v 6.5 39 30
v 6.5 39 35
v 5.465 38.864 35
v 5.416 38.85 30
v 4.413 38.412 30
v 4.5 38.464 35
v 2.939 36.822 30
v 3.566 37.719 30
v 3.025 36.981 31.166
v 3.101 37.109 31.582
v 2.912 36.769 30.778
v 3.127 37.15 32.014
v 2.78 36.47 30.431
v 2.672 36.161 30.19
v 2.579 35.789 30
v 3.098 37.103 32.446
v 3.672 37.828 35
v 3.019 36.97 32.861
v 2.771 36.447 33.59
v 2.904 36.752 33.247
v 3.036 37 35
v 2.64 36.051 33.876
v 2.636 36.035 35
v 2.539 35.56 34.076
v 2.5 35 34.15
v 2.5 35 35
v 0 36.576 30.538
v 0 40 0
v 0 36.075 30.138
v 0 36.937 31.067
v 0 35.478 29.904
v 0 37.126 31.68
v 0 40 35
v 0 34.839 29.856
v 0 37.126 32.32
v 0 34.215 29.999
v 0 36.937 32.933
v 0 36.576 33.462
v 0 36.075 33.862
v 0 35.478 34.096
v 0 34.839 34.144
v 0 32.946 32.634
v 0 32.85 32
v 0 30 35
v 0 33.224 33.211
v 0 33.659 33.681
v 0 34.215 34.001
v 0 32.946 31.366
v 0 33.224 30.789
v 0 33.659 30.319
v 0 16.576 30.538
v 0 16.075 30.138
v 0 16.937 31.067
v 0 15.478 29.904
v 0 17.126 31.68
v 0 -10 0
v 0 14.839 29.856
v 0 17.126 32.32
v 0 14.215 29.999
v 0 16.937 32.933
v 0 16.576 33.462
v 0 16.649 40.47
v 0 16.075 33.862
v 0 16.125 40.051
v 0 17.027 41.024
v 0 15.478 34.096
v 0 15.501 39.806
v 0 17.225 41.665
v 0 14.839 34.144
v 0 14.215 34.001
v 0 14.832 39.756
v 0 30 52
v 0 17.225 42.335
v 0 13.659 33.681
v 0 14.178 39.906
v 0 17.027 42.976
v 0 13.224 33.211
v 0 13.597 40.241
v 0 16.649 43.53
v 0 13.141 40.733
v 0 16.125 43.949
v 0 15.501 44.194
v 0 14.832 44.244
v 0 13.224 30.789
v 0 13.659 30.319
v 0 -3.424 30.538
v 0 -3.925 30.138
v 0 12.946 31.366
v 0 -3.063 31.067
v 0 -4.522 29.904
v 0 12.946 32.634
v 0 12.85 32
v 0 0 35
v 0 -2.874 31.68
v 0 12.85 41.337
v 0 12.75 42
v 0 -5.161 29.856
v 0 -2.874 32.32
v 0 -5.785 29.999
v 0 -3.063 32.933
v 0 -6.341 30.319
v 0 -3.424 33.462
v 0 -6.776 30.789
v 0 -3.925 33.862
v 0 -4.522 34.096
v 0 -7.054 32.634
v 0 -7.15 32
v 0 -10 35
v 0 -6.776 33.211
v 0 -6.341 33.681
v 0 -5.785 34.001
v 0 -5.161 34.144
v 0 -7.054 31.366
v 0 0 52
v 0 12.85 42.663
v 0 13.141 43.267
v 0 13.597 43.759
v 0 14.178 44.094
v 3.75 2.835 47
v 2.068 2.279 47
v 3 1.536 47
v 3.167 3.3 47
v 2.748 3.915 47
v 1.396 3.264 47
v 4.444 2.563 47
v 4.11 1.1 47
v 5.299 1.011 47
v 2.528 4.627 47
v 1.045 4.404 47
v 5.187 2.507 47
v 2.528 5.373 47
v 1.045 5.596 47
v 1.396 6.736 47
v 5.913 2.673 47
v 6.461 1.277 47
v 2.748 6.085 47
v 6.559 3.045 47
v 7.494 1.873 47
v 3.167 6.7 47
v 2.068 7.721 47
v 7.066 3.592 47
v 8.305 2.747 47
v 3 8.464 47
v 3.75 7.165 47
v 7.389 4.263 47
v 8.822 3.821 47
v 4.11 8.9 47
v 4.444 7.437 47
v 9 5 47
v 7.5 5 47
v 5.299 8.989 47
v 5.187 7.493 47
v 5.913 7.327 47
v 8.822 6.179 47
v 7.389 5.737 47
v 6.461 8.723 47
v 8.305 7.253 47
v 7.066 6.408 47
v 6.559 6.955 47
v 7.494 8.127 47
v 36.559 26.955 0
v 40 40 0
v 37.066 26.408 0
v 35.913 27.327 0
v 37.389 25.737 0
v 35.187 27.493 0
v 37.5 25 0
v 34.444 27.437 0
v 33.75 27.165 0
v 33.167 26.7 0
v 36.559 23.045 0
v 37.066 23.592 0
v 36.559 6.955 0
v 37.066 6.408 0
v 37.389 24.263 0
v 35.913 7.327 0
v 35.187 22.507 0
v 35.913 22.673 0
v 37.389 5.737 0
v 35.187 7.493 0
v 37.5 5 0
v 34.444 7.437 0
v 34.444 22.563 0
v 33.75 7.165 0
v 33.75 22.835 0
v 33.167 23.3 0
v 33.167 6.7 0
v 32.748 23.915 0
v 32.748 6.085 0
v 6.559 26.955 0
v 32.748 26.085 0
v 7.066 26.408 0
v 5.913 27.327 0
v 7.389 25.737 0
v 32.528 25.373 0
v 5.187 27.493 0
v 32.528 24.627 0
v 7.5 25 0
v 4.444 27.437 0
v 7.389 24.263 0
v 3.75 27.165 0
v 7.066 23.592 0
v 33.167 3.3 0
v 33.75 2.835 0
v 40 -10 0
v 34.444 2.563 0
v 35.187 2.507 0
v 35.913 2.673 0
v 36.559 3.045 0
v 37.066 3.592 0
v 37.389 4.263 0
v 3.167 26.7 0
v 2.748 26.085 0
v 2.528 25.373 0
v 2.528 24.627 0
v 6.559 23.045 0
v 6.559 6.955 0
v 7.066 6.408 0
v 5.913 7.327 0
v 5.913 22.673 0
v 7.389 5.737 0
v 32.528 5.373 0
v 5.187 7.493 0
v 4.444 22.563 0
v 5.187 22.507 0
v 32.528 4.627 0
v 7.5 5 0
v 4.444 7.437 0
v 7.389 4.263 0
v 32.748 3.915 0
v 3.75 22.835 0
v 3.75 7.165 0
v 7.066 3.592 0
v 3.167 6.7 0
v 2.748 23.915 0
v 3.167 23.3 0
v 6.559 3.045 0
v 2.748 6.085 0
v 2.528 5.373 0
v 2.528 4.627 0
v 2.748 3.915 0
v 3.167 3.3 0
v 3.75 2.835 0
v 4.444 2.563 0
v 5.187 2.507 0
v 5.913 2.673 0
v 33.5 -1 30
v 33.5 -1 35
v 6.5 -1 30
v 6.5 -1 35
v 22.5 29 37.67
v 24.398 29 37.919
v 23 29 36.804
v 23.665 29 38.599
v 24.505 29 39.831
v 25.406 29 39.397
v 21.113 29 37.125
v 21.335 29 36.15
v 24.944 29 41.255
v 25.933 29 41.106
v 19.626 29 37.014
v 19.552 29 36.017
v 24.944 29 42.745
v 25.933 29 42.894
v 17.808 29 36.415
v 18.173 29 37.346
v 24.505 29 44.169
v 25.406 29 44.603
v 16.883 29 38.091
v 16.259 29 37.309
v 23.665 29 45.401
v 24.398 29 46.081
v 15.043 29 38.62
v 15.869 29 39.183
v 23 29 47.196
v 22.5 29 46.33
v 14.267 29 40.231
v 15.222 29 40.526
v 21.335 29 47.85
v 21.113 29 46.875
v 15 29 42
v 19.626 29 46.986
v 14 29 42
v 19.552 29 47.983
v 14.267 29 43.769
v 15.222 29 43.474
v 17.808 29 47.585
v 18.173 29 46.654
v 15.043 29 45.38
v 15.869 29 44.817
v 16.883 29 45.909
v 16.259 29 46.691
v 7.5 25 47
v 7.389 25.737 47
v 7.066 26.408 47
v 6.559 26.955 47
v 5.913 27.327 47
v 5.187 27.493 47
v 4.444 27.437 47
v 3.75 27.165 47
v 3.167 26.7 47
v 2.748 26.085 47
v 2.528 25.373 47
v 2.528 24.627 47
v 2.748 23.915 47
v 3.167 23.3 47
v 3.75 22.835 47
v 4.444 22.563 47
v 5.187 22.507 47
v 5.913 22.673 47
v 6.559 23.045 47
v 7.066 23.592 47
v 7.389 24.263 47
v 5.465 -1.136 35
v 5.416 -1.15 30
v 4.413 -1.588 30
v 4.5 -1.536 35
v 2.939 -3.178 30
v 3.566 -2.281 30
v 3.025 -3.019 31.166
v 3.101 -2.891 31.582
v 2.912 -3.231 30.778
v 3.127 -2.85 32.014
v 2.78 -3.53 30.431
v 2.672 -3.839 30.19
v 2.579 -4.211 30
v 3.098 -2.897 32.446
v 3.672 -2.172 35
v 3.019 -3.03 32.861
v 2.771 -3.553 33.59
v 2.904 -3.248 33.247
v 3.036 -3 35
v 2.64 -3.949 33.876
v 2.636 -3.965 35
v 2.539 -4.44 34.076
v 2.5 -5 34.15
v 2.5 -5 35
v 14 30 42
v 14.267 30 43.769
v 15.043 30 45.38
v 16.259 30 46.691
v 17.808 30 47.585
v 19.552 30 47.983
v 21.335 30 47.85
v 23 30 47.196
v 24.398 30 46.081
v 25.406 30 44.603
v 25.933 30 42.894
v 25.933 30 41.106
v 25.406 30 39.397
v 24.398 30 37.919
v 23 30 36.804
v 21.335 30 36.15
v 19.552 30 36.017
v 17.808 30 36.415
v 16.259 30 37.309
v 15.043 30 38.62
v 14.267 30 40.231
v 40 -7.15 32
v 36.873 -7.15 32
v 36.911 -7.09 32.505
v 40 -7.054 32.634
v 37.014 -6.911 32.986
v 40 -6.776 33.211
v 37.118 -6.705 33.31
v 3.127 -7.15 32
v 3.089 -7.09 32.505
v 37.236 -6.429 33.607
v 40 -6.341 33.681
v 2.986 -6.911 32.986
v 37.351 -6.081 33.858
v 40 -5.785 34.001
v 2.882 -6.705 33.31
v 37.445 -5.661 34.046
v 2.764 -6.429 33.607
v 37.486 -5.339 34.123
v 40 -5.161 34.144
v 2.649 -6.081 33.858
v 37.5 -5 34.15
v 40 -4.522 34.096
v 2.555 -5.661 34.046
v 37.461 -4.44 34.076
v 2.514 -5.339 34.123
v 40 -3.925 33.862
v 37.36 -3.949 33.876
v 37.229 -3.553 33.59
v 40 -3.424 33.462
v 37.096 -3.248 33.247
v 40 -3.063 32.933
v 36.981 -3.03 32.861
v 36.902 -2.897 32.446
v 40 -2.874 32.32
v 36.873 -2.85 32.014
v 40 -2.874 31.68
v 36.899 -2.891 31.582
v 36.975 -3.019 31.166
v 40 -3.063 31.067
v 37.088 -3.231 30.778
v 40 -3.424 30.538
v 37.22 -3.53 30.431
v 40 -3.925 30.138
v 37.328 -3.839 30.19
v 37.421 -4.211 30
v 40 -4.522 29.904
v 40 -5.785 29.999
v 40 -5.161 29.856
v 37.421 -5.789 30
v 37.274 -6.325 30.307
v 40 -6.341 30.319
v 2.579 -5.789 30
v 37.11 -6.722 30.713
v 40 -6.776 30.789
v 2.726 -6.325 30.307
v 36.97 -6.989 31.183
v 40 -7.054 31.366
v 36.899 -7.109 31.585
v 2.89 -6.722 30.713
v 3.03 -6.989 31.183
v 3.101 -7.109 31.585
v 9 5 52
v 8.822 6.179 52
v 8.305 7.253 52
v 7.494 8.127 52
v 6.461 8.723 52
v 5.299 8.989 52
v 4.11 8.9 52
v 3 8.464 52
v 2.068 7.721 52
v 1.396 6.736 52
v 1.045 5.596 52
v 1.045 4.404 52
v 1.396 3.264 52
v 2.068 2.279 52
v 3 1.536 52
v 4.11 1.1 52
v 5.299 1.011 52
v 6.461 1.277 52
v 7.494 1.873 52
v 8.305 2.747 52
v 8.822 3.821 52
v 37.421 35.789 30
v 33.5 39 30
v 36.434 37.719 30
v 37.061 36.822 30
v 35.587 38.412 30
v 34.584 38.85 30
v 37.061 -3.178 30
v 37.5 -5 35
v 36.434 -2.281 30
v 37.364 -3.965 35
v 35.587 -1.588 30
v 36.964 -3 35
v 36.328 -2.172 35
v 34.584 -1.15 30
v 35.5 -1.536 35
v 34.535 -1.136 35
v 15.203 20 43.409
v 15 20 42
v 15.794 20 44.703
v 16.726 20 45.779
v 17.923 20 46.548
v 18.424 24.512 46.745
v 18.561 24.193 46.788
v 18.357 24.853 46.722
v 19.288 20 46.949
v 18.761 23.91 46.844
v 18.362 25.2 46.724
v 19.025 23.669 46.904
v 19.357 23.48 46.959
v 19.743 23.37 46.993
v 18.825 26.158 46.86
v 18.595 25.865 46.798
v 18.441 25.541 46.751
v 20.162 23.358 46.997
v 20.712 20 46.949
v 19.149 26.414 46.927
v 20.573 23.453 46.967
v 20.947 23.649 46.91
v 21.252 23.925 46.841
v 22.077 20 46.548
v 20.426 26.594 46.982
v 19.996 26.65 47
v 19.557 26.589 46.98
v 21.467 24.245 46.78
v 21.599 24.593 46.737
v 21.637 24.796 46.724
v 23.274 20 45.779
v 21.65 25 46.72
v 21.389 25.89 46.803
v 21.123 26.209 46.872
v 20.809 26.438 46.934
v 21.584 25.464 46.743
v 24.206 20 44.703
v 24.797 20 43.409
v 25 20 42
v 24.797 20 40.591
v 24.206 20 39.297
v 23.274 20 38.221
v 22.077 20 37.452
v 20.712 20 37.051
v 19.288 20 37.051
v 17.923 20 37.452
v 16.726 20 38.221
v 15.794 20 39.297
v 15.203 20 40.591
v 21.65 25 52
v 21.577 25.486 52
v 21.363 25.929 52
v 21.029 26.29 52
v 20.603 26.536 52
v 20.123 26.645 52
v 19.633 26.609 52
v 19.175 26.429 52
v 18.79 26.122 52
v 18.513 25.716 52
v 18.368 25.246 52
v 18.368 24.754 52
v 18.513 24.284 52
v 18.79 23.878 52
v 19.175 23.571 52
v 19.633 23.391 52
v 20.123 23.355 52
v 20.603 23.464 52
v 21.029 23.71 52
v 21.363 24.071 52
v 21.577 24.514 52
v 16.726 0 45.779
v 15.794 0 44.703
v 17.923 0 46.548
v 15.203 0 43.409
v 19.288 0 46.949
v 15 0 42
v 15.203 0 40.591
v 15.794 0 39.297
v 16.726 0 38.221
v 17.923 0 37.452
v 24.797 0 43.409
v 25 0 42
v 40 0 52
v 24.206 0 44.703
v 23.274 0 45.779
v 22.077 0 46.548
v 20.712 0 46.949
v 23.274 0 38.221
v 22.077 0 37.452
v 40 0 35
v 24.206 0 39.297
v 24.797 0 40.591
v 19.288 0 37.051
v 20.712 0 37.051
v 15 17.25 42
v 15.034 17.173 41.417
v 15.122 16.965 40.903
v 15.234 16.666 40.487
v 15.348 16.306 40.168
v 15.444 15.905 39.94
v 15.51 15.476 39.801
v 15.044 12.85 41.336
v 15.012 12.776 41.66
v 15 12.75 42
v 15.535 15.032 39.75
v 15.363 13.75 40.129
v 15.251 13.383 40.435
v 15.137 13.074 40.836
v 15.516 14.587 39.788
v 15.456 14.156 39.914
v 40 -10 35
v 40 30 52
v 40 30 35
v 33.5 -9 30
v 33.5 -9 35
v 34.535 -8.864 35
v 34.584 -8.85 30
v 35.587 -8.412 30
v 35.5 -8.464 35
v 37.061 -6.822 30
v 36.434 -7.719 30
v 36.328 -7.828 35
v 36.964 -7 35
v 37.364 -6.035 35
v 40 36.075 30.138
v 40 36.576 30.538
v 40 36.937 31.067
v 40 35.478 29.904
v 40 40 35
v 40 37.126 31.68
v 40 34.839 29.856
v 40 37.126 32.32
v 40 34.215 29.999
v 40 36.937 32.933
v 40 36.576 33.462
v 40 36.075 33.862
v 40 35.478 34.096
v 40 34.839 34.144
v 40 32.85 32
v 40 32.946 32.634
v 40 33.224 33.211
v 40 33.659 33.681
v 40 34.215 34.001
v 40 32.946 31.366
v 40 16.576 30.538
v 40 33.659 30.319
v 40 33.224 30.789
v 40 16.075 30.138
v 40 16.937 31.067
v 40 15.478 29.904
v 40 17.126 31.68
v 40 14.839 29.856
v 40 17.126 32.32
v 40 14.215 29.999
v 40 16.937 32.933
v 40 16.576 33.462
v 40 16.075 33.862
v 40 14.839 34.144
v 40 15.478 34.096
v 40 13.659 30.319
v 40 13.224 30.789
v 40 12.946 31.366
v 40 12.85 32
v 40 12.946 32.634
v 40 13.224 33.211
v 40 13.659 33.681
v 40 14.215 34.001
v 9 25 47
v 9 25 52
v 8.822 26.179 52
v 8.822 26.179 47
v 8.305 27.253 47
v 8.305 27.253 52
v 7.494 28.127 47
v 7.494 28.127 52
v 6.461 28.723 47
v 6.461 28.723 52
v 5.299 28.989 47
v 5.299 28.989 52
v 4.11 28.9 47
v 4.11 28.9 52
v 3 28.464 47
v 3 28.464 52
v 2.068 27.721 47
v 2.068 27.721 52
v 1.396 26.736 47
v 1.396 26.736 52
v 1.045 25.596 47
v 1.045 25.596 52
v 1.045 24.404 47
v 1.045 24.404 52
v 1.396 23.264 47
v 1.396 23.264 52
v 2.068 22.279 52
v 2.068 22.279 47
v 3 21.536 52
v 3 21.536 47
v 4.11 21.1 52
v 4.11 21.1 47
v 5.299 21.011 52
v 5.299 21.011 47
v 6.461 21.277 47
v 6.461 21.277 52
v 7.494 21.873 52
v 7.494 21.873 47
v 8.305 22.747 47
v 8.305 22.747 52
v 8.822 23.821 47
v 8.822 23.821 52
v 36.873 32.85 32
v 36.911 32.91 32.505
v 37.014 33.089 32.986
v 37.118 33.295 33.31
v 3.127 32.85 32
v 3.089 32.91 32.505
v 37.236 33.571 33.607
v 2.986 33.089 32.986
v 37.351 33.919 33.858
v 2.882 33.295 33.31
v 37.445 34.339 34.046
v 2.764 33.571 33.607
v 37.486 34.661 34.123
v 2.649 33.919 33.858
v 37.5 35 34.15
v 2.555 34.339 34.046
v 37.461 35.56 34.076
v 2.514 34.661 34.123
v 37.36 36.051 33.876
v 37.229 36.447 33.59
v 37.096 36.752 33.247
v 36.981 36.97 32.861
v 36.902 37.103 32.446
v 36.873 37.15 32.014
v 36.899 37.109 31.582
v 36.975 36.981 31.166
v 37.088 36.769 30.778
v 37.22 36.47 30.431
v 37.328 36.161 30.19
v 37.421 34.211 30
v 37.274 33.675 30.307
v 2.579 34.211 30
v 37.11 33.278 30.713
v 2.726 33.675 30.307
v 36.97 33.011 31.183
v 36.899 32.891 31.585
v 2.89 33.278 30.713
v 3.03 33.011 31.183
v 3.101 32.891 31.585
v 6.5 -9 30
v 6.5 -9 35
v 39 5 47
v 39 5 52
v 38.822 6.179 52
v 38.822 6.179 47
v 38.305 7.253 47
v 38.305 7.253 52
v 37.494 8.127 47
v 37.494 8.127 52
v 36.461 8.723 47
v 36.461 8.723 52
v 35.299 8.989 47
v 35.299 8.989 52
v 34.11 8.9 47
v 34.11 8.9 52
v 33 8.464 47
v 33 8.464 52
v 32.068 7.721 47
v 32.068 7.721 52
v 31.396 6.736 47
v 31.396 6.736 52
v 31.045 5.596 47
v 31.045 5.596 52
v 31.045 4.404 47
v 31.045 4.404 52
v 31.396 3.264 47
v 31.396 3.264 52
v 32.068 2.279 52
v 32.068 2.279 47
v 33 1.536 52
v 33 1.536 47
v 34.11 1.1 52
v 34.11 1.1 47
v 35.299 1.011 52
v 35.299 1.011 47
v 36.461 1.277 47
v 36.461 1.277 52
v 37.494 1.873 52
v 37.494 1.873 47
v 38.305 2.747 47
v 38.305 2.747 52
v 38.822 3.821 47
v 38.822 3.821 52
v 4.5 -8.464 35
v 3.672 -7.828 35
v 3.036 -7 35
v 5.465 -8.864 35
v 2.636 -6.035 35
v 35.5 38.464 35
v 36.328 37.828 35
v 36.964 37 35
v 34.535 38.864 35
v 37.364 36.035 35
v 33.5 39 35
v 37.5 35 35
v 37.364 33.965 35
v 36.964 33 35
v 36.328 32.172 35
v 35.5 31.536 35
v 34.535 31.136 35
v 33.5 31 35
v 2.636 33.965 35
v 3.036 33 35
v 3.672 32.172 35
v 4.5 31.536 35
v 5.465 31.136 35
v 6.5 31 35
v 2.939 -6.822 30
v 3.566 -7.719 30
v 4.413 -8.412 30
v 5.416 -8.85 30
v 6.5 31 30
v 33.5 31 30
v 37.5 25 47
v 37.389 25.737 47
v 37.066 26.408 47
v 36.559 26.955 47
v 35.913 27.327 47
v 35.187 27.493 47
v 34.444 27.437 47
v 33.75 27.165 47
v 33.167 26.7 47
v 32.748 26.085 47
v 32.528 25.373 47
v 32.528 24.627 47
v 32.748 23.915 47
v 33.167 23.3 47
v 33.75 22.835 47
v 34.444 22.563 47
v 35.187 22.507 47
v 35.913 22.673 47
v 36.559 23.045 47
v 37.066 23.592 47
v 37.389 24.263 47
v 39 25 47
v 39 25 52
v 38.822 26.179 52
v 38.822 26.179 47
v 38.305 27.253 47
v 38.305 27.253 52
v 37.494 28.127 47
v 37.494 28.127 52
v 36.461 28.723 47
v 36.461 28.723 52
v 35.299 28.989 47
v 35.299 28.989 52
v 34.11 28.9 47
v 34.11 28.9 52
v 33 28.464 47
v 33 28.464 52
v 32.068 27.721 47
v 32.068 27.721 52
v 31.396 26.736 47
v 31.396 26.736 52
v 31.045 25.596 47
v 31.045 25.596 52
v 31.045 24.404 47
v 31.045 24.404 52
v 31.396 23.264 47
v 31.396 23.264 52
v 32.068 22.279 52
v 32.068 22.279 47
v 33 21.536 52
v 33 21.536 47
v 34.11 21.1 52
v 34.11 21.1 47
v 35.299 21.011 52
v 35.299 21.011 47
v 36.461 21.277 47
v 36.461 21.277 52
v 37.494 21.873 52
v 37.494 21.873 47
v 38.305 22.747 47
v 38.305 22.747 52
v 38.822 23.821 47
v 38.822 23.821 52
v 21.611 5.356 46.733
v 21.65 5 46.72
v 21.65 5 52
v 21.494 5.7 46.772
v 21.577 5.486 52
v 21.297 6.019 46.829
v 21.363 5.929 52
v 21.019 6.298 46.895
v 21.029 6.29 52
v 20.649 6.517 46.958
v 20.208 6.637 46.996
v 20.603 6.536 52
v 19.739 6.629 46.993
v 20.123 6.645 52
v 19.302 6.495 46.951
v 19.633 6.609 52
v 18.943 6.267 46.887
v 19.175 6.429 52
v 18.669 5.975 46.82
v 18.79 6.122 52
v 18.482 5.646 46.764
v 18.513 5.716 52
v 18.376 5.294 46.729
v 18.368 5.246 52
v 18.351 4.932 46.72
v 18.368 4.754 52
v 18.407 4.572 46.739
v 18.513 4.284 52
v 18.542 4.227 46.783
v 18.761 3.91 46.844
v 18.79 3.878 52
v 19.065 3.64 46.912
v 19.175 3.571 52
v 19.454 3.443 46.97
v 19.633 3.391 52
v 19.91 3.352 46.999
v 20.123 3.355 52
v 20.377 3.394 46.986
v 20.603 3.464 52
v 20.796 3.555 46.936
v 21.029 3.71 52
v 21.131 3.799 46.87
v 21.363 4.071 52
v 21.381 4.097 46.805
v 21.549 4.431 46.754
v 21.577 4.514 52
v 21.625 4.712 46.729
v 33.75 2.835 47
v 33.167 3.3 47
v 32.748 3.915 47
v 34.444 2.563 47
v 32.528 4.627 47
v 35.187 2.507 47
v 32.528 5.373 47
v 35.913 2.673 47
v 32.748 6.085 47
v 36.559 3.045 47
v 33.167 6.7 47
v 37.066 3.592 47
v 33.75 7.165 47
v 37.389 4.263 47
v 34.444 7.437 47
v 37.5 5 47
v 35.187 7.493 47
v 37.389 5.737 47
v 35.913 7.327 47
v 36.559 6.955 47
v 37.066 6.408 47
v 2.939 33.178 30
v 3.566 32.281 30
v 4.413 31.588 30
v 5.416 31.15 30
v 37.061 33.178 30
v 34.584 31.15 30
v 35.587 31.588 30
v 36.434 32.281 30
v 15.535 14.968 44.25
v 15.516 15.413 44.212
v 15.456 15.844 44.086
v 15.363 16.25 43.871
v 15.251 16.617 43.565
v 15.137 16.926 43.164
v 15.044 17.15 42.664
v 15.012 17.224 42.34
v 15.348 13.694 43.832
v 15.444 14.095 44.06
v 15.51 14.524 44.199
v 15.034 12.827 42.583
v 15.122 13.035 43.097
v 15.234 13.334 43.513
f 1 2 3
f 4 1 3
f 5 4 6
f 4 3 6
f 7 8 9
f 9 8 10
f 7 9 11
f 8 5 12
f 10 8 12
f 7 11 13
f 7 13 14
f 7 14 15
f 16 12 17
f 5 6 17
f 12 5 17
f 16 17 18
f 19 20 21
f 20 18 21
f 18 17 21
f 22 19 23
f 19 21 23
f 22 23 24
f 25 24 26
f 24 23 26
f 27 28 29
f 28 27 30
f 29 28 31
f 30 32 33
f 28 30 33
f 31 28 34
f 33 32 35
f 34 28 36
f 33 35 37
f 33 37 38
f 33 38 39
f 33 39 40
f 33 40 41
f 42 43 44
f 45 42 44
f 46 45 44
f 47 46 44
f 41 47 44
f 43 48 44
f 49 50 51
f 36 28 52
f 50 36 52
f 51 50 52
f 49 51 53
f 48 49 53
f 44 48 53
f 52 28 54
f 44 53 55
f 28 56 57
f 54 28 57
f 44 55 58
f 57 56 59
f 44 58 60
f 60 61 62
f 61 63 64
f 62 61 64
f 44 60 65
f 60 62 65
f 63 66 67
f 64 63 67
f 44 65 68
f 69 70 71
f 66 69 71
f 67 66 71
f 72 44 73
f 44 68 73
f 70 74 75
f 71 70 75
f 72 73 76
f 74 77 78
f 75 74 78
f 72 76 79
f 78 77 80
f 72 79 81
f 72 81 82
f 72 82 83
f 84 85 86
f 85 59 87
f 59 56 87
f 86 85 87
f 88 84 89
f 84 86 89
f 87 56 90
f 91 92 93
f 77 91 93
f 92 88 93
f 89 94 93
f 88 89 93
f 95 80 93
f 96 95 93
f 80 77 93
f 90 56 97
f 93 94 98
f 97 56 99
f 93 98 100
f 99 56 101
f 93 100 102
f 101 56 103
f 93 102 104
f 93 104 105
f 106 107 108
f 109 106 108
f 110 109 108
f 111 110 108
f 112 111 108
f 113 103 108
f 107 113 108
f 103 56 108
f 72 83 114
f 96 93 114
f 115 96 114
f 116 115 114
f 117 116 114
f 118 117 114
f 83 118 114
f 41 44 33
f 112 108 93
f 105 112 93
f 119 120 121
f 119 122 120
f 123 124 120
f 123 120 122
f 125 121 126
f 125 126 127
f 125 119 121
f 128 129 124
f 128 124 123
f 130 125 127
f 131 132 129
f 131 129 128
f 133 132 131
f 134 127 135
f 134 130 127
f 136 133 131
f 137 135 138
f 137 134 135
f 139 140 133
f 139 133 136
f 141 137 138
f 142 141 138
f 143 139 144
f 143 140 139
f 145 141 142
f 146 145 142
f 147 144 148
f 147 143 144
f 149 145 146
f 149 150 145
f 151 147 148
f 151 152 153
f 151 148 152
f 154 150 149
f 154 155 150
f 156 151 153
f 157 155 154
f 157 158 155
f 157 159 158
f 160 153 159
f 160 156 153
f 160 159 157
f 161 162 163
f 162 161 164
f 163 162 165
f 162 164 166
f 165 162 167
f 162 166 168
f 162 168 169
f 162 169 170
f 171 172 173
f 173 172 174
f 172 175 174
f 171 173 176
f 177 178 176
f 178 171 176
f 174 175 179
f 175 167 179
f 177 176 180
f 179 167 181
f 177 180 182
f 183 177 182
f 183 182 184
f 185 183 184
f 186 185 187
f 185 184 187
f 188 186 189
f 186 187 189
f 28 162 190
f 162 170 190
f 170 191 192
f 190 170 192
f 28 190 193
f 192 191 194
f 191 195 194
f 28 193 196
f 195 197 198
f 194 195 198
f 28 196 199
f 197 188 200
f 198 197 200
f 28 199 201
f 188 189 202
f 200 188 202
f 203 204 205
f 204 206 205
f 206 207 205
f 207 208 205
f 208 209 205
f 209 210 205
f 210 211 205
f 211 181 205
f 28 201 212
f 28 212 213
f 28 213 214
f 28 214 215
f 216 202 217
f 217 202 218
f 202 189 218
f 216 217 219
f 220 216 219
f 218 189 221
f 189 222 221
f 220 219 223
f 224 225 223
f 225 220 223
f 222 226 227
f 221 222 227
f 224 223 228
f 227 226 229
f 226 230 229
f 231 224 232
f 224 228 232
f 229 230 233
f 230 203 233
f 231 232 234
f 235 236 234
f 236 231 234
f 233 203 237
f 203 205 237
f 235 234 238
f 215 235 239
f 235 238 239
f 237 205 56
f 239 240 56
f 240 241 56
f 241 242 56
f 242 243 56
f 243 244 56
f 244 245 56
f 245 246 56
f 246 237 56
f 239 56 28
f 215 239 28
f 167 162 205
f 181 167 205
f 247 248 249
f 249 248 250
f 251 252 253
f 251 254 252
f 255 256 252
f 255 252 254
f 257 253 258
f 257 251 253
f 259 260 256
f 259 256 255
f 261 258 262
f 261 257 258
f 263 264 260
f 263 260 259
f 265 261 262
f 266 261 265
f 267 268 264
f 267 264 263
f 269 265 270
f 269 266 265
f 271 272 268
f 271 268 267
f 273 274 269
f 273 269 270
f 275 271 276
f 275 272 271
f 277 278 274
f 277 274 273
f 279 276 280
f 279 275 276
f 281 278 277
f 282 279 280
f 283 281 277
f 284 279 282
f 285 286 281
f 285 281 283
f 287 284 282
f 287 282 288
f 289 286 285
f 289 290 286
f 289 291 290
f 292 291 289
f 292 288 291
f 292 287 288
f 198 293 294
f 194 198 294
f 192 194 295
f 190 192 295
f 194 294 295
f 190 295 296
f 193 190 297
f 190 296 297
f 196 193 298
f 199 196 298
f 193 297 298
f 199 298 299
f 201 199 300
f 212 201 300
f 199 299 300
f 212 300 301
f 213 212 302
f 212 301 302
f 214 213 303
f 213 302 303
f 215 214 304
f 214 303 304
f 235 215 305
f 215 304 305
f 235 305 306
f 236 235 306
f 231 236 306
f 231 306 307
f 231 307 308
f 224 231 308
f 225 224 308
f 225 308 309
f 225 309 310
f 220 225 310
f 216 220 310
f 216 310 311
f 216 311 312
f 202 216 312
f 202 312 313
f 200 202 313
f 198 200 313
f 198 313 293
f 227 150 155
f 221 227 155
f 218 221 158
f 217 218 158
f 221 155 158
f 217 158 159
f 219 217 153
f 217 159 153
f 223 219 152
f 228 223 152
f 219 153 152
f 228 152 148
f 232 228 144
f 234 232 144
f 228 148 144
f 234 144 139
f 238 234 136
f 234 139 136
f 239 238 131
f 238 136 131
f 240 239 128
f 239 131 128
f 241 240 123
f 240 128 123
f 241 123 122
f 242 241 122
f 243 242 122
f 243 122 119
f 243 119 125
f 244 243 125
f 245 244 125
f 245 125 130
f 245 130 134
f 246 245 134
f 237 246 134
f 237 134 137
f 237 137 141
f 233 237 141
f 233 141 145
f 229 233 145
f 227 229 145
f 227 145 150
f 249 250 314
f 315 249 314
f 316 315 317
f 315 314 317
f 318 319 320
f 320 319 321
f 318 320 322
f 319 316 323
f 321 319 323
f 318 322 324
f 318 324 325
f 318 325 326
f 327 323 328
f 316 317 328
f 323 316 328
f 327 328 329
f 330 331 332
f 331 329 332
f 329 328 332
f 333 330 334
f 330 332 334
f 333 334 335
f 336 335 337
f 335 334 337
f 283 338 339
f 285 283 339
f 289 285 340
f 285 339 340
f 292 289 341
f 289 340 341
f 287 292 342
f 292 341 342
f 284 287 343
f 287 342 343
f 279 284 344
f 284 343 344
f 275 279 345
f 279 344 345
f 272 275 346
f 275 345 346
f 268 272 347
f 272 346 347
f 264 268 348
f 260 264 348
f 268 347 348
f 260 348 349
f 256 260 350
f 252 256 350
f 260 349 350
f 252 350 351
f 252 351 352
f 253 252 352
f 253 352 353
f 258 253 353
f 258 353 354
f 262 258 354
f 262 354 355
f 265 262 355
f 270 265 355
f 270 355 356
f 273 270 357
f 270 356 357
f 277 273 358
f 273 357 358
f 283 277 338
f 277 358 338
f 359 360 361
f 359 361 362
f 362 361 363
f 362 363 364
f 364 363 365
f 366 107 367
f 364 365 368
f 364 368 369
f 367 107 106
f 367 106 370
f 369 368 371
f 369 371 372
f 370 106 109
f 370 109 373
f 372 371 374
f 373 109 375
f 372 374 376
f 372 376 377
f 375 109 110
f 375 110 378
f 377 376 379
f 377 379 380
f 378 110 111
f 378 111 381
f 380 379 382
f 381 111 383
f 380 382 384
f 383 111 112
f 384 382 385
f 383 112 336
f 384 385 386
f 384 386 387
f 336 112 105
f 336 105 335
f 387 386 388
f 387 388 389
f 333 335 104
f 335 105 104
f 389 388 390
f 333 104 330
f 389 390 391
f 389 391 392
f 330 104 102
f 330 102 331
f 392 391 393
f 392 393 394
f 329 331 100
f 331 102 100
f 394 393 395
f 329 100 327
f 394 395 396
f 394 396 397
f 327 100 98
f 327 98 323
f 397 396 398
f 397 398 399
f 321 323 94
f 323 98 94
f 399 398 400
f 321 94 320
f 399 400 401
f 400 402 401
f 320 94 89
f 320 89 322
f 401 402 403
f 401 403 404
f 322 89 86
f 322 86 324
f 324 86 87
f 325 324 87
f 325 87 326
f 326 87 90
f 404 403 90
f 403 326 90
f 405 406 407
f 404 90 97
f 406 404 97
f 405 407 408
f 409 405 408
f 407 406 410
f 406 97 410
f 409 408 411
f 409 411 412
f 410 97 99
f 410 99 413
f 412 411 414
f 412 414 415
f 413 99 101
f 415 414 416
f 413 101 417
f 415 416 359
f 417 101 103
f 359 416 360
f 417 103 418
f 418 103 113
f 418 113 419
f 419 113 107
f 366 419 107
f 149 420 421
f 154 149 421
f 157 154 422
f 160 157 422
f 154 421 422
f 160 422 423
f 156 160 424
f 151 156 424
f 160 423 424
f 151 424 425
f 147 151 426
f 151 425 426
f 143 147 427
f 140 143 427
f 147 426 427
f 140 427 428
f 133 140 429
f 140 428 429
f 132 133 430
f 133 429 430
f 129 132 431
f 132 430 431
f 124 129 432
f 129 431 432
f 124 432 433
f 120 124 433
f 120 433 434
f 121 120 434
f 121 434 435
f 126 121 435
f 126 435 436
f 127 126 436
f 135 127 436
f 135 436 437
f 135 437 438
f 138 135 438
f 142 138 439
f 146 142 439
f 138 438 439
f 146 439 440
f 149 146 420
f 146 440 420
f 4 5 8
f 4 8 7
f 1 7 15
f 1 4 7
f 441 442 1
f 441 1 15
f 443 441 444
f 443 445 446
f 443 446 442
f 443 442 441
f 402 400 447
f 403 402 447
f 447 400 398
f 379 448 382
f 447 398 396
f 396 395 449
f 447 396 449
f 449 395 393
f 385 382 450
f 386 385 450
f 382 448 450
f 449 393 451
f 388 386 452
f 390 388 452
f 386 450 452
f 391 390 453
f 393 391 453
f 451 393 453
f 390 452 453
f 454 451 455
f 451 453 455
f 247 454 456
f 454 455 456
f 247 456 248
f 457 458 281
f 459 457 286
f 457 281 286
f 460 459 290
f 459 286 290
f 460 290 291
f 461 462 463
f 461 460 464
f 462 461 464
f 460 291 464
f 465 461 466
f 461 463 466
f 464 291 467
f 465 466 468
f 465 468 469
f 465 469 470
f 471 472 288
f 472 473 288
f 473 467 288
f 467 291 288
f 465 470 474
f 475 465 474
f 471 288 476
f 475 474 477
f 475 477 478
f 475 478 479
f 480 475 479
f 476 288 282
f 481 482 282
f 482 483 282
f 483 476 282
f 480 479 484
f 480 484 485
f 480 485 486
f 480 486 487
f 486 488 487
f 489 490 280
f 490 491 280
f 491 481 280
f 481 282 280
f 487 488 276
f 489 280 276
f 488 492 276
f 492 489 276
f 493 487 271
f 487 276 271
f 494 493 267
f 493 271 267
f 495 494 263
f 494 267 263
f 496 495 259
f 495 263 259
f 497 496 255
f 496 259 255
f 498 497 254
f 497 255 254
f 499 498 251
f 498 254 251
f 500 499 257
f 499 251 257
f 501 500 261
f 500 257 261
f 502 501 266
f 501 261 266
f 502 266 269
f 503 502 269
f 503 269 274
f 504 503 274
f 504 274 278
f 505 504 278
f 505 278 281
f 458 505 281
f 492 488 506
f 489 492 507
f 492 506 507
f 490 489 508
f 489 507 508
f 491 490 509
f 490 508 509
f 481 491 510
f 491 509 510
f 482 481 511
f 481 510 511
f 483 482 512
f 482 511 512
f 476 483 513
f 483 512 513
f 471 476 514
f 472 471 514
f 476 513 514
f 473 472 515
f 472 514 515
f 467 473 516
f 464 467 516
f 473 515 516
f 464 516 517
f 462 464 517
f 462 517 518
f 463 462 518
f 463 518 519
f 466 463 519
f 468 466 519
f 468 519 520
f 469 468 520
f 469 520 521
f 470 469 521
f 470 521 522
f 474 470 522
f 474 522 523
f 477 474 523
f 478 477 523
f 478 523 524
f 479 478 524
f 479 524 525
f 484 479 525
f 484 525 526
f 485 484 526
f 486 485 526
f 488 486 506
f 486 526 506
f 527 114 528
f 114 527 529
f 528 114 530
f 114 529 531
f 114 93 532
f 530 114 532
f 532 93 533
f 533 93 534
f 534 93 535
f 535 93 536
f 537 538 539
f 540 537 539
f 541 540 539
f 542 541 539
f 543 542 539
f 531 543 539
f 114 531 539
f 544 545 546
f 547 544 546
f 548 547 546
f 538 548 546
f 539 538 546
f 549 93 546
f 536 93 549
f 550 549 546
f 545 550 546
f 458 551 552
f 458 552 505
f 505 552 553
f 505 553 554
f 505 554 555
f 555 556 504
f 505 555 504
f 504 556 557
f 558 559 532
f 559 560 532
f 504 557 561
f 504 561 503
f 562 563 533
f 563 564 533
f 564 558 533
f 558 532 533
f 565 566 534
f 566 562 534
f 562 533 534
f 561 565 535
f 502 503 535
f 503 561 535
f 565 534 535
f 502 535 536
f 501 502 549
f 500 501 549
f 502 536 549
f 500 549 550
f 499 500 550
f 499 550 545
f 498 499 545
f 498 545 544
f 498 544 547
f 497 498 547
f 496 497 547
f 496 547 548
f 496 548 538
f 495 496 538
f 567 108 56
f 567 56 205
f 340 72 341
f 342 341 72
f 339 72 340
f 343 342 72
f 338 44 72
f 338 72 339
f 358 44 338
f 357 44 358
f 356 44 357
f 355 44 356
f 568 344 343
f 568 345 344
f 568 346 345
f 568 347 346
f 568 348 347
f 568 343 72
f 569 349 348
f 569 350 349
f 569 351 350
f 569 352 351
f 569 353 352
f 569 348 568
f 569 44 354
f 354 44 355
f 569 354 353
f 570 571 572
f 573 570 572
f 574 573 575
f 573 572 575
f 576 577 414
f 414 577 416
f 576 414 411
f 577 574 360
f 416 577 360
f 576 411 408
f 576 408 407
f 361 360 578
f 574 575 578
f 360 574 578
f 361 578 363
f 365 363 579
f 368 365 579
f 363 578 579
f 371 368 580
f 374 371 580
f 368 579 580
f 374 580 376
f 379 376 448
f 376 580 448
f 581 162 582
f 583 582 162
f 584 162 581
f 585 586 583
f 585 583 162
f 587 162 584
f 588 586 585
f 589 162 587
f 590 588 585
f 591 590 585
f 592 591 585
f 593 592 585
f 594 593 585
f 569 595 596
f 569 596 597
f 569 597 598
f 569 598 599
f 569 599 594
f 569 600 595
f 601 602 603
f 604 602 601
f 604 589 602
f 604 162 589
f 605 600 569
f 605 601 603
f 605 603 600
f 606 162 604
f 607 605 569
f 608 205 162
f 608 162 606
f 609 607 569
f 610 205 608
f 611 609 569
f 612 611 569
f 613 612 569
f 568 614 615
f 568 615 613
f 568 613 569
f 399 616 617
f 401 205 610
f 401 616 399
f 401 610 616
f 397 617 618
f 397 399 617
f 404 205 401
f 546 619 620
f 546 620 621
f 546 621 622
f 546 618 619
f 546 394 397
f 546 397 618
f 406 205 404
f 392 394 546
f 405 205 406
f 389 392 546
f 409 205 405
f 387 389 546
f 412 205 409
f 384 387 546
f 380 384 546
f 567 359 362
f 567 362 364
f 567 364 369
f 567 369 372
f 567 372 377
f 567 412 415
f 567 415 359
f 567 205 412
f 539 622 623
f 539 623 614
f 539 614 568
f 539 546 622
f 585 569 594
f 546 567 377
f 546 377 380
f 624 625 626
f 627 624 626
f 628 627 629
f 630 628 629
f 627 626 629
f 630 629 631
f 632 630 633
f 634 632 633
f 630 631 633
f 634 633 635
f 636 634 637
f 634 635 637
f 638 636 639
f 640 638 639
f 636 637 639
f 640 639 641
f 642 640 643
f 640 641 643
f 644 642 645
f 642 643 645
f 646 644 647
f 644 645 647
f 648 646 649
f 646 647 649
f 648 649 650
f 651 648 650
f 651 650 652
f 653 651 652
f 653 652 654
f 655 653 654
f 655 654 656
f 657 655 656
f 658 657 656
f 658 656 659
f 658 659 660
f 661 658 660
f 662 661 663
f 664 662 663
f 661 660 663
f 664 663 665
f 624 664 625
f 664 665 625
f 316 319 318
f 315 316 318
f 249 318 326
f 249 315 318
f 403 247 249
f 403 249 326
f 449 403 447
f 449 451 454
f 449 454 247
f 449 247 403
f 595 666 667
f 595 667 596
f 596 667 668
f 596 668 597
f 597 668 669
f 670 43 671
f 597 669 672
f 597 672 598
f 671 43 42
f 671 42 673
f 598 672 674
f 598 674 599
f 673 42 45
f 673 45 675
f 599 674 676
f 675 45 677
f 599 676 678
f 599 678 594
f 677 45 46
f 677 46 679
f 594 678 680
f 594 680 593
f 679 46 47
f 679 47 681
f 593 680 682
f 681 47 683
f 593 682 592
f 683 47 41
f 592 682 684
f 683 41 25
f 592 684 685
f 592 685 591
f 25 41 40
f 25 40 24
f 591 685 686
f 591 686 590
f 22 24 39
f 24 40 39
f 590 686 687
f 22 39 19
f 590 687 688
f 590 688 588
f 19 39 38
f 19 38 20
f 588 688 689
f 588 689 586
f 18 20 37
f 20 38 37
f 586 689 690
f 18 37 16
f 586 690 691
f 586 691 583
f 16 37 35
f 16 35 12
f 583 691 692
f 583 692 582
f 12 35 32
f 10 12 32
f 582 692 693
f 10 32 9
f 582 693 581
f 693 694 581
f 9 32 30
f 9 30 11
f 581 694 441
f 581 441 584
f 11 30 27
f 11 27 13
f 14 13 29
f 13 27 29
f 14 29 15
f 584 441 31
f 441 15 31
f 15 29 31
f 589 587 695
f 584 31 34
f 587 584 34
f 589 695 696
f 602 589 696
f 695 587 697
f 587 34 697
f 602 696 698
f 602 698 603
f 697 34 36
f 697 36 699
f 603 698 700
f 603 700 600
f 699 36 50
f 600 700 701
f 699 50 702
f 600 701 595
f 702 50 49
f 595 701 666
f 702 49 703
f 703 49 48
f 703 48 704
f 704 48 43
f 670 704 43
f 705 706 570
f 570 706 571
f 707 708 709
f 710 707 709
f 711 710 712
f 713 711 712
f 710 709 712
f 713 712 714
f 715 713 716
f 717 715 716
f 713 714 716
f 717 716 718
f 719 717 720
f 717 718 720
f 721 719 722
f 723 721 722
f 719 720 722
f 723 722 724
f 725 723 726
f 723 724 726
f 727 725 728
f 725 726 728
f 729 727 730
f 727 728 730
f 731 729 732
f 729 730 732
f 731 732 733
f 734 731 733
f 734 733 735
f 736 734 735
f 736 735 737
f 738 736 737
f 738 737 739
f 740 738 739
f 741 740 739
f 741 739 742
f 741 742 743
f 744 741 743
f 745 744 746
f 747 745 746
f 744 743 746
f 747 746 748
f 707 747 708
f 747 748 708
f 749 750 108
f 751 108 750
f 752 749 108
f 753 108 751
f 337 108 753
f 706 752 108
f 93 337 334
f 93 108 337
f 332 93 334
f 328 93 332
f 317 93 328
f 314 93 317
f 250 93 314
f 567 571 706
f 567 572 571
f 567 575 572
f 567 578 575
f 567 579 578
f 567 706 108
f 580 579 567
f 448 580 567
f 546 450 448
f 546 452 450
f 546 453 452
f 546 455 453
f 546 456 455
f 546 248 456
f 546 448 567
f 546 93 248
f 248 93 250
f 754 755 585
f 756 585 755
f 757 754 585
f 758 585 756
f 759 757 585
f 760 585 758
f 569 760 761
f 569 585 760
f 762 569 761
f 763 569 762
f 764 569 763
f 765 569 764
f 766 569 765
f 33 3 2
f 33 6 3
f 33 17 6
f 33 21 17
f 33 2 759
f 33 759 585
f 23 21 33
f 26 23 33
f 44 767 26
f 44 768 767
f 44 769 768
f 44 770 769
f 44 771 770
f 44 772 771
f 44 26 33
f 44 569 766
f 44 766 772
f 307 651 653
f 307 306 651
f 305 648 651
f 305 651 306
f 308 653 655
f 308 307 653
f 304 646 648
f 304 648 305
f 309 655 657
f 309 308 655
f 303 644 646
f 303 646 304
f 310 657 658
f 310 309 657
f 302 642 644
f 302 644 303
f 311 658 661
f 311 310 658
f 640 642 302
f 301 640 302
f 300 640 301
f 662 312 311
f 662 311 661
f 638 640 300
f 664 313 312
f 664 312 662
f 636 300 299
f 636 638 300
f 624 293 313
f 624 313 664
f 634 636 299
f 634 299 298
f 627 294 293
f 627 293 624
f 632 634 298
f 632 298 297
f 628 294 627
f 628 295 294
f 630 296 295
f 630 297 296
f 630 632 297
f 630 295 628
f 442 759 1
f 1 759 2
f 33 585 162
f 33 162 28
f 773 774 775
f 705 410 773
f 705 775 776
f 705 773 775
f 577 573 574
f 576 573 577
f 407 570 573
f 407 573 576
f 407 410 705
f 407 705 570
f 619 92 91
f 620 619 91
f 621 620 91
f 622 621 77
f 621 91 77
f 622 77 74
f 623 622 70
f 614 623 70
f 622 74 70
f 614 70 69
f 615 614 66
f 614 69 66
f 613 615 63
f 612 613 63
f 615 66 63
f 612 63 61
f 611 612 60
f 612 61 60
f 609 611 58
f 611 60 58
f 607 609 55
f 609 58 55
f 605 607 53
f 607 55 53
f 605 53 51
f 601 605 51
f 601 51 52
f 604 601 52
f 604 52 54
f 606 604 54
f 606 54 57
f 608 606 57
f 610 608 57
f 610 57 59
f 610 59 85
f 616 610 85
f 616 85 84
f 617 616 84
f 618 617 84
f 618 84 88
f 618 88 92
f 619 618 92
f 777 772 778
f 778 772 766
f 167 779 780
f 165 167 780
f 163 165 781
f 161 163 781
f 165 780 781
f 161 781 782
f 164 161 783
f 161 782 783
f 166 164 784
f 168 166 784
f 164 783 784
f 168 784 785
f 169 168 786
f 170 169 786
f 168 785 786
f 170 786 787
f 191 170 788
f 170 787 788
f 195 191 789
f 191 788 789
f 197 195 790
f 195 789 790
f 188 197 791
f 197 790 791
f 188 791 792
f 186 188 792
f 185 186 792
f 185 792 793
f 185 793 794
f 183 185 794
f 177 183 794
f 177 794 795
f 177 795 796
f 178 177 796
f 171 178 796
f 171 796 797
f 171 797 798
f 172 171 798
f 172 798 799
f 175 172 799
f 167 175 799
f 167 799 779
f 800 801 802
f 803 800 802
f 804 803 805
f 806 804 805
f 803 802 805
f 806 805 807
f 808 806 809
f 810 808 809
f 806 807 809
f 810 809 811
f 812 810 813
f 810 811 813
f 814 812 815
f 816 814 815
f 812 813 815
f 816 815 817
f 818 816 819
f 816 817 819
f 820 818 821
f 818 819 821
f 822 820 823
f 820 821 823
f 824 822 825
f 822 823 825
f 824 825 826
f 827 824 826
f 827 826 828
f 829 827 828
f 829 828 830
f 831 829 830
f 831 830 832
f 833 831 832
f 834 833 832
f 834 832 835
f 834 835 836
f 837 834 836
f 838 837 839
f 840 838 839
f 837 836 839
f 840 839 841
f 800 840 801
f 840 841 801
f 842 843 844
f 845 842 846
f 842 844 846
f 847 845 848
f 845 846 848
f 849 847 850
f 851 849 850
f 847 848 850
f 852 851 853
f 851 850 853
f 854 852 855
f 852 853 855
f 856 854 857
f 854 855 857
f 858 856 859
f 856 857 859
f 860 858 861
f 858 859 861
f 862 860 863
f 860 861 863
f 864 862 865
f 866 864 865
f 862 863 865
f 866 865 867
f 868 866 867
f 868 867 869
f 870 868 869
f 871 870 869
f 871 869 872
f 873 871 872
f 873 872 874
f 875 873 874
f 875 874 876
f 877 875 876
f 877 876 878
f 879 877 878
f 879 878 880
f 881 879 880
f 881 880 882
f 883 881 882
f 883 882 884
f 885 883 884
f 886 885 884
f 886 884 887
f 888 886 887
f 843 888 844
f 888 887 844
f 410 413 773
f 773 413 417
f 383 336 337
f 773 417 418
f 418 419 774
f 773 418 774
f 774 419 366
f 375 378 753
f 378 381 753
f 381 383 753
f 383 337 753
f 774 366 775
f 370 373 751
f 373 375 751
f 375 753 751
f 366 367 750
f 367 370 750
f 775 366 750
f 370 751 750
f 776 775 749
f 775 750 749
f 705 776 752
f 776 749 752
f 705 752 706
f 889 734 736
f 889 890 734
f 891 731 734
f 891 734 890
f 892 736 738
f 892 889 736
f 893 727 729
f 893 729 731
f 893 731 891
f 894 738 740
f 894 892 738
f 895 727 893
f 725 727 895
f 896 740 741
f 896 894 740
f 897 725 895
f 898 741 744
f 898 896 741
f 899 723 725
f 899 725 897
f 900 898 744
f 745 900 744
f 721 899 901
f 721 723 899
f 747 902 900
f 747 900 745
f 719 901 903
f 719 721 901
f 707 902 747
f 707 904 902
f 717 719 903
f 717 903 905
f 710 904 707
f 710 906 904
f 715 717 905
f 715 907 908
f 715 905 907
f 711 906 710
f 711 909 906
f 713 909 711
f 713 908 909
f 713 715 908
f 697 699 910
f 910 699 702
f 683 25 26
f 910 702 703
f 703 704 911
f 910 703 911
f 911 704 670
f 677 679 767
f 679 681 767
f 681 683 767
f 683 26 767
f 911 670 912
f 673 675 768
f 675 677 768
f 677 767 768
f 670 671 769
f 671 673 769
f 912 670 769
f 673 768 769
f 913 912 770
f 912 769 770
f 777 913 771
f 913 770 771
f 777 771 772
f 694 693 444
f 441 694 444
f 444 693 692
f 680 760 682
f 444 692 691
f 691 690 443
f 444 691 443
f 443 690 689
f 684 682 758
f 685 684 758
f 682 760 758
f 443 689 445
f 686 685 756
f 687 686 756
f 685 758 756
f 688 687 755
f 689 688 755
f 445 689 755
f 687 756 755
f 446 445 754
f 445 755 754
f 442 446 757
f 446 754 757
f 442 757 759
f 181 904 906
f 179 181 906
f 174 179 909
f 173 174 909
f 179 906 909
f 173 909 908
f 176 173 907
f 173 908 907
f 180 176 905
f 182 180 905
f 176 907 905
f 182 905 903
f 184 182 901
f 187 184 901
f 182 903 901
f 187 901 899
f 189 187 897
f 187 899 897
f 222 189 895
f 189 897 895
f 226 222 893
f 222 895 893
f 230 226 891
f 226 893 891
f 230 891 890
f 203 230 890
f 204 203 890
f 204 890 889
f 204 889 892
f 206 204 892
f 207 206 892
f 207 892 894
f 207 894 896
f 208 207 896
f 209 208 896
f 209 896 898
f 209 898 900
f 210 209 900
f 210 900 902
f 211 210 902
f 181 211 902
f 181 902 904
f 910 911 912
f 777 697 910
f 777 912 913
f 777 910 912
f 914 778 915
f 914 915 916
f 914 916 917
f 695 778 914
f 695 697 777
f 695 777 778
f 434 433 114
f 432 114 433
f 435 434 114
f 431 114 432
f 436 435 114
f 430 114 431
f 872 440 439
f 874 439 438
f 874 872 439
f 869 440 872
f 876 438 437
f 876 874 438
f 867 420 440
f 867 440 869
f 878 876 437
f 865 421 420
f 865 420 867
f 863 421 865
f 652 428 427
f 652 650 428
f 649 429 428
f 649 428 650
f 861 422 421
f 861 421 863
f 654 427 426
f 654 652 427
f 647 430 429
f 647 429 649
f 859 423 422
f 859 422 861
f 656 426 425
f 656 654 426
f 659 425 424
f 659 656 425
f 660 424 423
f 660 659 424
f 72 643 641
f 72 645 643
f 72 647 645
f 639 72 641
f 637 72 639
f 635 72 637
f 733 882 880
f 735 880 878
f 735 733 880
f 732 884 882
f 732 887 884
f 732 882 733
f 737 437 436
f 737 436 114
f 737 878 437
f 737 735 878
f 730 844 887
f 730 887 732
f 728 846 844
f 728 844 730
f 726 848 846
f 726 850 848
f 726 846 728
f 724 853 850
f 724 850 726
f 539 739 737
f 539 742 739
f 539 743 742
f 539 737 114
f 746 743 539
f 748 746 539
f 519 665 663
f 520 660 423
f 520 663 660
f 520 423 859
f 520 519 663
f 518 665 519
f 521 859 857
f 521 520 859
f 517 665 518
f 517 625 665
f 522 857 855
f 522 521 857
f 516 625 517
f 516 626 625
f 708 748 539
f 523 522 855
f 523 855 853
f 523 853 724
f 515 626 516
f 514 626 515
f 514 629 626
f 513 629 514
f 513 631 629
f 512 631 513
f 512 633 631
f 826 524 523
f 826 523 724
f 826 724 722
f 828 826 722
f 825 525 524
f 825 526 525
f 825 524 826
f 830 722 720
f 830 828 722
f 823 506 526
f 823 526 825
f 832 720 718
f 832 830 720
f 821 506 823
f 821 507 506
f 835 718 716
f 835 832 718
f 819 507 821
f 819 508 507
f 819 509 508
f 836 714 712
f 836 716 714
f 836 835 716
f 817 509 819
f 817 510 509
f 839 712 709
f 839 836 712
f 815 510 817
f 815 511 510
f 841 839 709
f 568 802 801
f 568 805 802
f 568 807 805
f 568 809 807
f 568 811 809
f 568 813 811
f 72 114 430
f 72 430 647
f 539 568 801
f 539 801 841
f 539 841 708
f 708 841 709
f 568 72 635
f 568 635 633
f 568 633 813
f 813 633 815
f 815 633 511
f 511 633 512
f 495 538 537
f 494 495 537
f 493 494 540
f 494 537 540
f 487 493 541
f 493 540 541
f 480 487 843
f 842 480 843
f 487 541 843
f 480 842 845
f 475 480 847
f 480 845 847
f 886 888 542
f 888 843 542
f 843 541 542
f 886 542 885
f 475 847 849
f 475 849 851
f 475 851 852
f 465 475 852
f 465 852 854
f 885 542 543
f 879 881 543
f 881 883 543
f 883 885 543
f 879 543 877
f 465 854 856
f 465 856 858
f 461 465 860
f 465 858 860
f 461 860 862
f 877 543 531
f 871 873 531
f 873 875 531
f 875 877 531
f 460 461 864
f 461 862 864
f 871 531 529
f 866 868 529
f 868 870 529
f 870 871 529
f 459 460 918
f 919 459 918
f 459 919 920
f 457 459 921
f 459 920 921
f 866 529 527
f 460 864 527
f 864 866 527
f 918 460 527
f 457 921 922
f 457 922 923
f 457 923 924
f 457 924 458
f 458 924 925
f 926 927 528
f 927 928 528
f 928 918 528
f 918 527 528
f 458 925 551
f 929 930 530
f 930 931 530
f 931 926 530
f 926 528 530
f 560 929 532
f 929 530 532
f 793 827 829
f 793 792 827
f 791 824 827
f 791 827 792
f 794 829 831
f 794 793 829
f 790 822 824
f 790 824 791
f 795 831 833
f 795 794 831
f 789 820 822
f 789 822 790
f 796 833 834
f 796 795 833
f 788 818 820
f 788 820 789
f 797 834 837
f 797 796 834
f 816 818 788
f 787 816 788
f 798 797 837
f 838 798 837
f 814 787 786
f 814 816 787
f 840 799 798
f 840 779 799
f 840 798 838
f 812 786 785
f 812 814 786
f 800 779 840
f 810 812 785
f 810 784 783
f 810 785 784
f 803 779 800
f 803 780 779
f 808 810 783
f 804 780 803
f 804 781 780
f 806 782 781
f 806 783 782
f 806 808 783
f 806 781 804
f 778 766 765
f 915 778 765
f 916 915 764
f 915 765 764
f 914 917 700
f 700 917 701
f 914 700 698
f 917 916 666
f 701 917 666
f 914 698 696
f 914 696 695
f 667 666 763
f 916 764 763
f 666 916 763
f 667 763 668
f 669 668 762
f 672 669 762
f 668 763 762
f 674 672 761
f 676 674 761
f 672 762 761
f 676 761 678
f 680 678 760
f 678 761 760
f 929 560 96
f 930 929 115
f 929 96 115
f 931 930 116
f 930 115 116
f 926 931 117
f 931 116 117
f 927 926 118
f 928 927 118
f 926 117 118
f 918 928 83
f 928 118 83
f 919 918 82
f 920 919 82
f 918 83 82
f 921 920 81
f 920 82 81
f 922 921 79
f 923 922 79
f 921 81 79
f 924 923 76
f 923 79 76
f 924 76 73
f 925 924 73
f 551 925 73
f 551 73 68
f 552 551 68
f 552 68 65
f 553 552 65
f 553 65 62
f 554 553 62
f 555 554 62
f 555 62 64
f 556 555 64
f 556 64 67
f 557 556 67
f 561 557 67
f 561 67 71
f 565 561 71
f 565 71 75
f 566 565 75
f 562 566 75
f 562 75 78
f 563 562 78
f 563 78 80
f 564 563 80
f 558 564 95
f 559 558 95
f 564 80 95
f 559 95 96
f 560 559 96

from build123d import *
from build123d import SkipClean  # not in build123d's __all__

# Parameters (mm, degrees)
F0_W      = 40
F0_H      = 30
F1_DEPTH  = 52
F2_R      = 5
F3_DEPTH  = 20
F4_R      = 1.65
F5_DEPTH  = 10
F6_R      = 2.5
F7_DEPTH  = 52.001
F8_R      = 4
F9_DEPTH  = 5
F10_W     = 40
F10_H     = 35
F11_DEPTH = 10
F12_W     = 40
F12_H     = 35
F13_DEPTH = 10
F15_DEPTH = 5
F16_R     = 2.15
F17_DEPTH = 40.001
F18_R     = 5
F19_DEPTH = 40.001
F20_R     = 6
F21_DEPTH = 1
F22_R     = 2.25
F23_DEPTH = 15.5358573251


with BuildPart() as f1:
    # F0 (on Top) → F1 (new body)
    with BuildSketch(Plane.XY):
        with Locations((20, 15)):
            Rectangle(F0_W, F0_H)
    extrude(amount=F1_DEPTH)

    # F2 (on face) → F3 (cut)
    with BuildSketch(Plane.XZ):
        with Locations((20, 42)):
            Circle(F2_R)
    extrude(amount=-F3_DEPTH, mode=Mode.SUBTRACT)

    # F4 (on face) → F5 (cut)
    with BuildSketch(Plane.XY.offset(52)):
        with Locations((20, 5)):
            Circle(F4_R)
        with Locations((20, 25)):
            Circle(F4_R)
    extrude(amount=-F5_DEPTH, mode=Mode.SUBTRACT)

    # F6 (on face) → F7 (cut, through all)
    with BuildSketch(Plane.XY.offset(52)):
        with Locations((5, 5)):
            Circle(F6_R)
        with Locations((5, 25)):
            Circle(F6_R)
        with Locations((35, 5)):
            Circle(F6_R)
        with Locations((35, 25)):
            Circle(F6_R)
    extrude(amount=-F7_DEPTH, mode=Mode.SUBTRACT)

    # F8 (on face) → F9 (cut)
    with BuildSketch(Plane.XY.offset(52)):
        with Locations((5, 25)):
            Circle(F8_R)
        with Locations((5, 5)):
            Circle(F8_R)
        with Locations((35, 25)):
            Circle(F8_R)
        with Locations((35, 5)):
            Circle(F8_R)
    extrude(amount=-F9_DEPTH, mode=Mode.SUBTRACT)

    # F10 (on face) → F11 (join)
    with BuildSketch(Plane.XZ):
        with Locations((20, 17.5)):
            Rectangle(F10_W, F10_H)
    extrude(amount=F11_DEPTH)

    # F12 (on face) → F13 (join)
    with BuildSketch(Plane(origin=(0, 30, 0), x_dir=(-1, 0, 0), z_dir=(0, 1, 0))):
        with Locations((-20, 17.5)):
            Rectangle(F12_W, F12_H)
    extrude(amount=F13_DEPTH)

    # F14 (on face) → F15 (cut)
    with BuildSketch(Plane.XY.offset(35)):
        with BuildLine():
            Line((6.5, 31), (33.5, 31))
            ThreePointArc((33.5, 31), (36.3284271247, 32.1715728753), (37.5, 35))
            ThreePointArc((37.5, 35), (36.3284271247, 37.8284271247), (33.5, 39))
            Line((33.5, 39), (6.5, 39))
            ThreePointArc((6.5, 39), (3.6715728753, 37.8284271247), (2.5, 35))
            ThreePointArc((2.5, 35), (3.6715728753, 32.1715728753), (6.5, 31))
        make_face()
        with BuildLine():
            Line((6.5, -9), (33.5, -9))
            ThreePointArc((33.5, -9), (36.3284271247, -7.8284271247), (37.5, -5))
            ThreePointArc((37.5, -5), (36.3284271247, -2.1715728753), (33.5, -1))
            Line((33.5, -1), (6.5, -1))
            ThreePointArc((6.5, -1), (3.6715728753, -2.1715728753), (2.5, -5))
            ThreePointArc((2.5, -5), (3.6715728753, -7.8284271247), (6.5, -9))
        make_face()
    extrude(amount=-F15_DEPTH, mode=Mode.SUBTRACT)

    # F16 (on face) → F17 (cut, through all)
    with BuildSketch(Plane(origin=(0, 0, 0), x_dir=(0, -1, 0), z_dir=(-1, 0, 0))):
        with Locations((-15, 32)):
            Circle(F16_R)
        with Locations((-35, 32)):
            Circle(F16_R)
        with Locations((5, 32)):
            Circle(F16_R)
    extrude(amount=-F17_DEPTH, mode=Mode.SUBTRACT)

    # F18 (on face) → F19 (cut, through all)
    with BuildSketch(Plane(origin=(0, 30, 0), x_dir=(-1, 0, 0), z_dir=(0, 1, 0))):
        with Locations((-20, 42)):
            Circle(F18_R)
    with SkipClean():  # cleaning this boolean's faces spoils the solid; the shape is the same uncleaned
        extrude(amount=-F19_DEPTH, mode=Mode.SUBTRACT)

    # F20 (on face) → F21 (cut)
    with BuildSketch(Plane(origin=(0, 30, 0), x_dir=(-1, 0, 0), z_dir=(0, 1, 0))):
        with Locations((-20, 42)):
            Circle(F20_R)
    with SkipClean():  # cleaning this boolean's faces spoils the solid; the shape is the same uncleaned
        extrude(amount=-F21_DEPTH, mode=Mode.SUBTRACT)

    # F22 (on face) → F23 (cut, through all)
    with BuildSketch(Plane(origin=(0, 0, 0), x_dir=(0, -1, 0), z_dir=(-1, 0, 0))):
        with Locations((-15, 42)):
            Circle(F22_R)
    with SkipClean():  # cleaning this boolean's faces spoils the solid; the shape is the same uncleaned
        extrude(amount=-F23_DEPTH, mode=Mode.SUBTRACT)


solid = f1.part
